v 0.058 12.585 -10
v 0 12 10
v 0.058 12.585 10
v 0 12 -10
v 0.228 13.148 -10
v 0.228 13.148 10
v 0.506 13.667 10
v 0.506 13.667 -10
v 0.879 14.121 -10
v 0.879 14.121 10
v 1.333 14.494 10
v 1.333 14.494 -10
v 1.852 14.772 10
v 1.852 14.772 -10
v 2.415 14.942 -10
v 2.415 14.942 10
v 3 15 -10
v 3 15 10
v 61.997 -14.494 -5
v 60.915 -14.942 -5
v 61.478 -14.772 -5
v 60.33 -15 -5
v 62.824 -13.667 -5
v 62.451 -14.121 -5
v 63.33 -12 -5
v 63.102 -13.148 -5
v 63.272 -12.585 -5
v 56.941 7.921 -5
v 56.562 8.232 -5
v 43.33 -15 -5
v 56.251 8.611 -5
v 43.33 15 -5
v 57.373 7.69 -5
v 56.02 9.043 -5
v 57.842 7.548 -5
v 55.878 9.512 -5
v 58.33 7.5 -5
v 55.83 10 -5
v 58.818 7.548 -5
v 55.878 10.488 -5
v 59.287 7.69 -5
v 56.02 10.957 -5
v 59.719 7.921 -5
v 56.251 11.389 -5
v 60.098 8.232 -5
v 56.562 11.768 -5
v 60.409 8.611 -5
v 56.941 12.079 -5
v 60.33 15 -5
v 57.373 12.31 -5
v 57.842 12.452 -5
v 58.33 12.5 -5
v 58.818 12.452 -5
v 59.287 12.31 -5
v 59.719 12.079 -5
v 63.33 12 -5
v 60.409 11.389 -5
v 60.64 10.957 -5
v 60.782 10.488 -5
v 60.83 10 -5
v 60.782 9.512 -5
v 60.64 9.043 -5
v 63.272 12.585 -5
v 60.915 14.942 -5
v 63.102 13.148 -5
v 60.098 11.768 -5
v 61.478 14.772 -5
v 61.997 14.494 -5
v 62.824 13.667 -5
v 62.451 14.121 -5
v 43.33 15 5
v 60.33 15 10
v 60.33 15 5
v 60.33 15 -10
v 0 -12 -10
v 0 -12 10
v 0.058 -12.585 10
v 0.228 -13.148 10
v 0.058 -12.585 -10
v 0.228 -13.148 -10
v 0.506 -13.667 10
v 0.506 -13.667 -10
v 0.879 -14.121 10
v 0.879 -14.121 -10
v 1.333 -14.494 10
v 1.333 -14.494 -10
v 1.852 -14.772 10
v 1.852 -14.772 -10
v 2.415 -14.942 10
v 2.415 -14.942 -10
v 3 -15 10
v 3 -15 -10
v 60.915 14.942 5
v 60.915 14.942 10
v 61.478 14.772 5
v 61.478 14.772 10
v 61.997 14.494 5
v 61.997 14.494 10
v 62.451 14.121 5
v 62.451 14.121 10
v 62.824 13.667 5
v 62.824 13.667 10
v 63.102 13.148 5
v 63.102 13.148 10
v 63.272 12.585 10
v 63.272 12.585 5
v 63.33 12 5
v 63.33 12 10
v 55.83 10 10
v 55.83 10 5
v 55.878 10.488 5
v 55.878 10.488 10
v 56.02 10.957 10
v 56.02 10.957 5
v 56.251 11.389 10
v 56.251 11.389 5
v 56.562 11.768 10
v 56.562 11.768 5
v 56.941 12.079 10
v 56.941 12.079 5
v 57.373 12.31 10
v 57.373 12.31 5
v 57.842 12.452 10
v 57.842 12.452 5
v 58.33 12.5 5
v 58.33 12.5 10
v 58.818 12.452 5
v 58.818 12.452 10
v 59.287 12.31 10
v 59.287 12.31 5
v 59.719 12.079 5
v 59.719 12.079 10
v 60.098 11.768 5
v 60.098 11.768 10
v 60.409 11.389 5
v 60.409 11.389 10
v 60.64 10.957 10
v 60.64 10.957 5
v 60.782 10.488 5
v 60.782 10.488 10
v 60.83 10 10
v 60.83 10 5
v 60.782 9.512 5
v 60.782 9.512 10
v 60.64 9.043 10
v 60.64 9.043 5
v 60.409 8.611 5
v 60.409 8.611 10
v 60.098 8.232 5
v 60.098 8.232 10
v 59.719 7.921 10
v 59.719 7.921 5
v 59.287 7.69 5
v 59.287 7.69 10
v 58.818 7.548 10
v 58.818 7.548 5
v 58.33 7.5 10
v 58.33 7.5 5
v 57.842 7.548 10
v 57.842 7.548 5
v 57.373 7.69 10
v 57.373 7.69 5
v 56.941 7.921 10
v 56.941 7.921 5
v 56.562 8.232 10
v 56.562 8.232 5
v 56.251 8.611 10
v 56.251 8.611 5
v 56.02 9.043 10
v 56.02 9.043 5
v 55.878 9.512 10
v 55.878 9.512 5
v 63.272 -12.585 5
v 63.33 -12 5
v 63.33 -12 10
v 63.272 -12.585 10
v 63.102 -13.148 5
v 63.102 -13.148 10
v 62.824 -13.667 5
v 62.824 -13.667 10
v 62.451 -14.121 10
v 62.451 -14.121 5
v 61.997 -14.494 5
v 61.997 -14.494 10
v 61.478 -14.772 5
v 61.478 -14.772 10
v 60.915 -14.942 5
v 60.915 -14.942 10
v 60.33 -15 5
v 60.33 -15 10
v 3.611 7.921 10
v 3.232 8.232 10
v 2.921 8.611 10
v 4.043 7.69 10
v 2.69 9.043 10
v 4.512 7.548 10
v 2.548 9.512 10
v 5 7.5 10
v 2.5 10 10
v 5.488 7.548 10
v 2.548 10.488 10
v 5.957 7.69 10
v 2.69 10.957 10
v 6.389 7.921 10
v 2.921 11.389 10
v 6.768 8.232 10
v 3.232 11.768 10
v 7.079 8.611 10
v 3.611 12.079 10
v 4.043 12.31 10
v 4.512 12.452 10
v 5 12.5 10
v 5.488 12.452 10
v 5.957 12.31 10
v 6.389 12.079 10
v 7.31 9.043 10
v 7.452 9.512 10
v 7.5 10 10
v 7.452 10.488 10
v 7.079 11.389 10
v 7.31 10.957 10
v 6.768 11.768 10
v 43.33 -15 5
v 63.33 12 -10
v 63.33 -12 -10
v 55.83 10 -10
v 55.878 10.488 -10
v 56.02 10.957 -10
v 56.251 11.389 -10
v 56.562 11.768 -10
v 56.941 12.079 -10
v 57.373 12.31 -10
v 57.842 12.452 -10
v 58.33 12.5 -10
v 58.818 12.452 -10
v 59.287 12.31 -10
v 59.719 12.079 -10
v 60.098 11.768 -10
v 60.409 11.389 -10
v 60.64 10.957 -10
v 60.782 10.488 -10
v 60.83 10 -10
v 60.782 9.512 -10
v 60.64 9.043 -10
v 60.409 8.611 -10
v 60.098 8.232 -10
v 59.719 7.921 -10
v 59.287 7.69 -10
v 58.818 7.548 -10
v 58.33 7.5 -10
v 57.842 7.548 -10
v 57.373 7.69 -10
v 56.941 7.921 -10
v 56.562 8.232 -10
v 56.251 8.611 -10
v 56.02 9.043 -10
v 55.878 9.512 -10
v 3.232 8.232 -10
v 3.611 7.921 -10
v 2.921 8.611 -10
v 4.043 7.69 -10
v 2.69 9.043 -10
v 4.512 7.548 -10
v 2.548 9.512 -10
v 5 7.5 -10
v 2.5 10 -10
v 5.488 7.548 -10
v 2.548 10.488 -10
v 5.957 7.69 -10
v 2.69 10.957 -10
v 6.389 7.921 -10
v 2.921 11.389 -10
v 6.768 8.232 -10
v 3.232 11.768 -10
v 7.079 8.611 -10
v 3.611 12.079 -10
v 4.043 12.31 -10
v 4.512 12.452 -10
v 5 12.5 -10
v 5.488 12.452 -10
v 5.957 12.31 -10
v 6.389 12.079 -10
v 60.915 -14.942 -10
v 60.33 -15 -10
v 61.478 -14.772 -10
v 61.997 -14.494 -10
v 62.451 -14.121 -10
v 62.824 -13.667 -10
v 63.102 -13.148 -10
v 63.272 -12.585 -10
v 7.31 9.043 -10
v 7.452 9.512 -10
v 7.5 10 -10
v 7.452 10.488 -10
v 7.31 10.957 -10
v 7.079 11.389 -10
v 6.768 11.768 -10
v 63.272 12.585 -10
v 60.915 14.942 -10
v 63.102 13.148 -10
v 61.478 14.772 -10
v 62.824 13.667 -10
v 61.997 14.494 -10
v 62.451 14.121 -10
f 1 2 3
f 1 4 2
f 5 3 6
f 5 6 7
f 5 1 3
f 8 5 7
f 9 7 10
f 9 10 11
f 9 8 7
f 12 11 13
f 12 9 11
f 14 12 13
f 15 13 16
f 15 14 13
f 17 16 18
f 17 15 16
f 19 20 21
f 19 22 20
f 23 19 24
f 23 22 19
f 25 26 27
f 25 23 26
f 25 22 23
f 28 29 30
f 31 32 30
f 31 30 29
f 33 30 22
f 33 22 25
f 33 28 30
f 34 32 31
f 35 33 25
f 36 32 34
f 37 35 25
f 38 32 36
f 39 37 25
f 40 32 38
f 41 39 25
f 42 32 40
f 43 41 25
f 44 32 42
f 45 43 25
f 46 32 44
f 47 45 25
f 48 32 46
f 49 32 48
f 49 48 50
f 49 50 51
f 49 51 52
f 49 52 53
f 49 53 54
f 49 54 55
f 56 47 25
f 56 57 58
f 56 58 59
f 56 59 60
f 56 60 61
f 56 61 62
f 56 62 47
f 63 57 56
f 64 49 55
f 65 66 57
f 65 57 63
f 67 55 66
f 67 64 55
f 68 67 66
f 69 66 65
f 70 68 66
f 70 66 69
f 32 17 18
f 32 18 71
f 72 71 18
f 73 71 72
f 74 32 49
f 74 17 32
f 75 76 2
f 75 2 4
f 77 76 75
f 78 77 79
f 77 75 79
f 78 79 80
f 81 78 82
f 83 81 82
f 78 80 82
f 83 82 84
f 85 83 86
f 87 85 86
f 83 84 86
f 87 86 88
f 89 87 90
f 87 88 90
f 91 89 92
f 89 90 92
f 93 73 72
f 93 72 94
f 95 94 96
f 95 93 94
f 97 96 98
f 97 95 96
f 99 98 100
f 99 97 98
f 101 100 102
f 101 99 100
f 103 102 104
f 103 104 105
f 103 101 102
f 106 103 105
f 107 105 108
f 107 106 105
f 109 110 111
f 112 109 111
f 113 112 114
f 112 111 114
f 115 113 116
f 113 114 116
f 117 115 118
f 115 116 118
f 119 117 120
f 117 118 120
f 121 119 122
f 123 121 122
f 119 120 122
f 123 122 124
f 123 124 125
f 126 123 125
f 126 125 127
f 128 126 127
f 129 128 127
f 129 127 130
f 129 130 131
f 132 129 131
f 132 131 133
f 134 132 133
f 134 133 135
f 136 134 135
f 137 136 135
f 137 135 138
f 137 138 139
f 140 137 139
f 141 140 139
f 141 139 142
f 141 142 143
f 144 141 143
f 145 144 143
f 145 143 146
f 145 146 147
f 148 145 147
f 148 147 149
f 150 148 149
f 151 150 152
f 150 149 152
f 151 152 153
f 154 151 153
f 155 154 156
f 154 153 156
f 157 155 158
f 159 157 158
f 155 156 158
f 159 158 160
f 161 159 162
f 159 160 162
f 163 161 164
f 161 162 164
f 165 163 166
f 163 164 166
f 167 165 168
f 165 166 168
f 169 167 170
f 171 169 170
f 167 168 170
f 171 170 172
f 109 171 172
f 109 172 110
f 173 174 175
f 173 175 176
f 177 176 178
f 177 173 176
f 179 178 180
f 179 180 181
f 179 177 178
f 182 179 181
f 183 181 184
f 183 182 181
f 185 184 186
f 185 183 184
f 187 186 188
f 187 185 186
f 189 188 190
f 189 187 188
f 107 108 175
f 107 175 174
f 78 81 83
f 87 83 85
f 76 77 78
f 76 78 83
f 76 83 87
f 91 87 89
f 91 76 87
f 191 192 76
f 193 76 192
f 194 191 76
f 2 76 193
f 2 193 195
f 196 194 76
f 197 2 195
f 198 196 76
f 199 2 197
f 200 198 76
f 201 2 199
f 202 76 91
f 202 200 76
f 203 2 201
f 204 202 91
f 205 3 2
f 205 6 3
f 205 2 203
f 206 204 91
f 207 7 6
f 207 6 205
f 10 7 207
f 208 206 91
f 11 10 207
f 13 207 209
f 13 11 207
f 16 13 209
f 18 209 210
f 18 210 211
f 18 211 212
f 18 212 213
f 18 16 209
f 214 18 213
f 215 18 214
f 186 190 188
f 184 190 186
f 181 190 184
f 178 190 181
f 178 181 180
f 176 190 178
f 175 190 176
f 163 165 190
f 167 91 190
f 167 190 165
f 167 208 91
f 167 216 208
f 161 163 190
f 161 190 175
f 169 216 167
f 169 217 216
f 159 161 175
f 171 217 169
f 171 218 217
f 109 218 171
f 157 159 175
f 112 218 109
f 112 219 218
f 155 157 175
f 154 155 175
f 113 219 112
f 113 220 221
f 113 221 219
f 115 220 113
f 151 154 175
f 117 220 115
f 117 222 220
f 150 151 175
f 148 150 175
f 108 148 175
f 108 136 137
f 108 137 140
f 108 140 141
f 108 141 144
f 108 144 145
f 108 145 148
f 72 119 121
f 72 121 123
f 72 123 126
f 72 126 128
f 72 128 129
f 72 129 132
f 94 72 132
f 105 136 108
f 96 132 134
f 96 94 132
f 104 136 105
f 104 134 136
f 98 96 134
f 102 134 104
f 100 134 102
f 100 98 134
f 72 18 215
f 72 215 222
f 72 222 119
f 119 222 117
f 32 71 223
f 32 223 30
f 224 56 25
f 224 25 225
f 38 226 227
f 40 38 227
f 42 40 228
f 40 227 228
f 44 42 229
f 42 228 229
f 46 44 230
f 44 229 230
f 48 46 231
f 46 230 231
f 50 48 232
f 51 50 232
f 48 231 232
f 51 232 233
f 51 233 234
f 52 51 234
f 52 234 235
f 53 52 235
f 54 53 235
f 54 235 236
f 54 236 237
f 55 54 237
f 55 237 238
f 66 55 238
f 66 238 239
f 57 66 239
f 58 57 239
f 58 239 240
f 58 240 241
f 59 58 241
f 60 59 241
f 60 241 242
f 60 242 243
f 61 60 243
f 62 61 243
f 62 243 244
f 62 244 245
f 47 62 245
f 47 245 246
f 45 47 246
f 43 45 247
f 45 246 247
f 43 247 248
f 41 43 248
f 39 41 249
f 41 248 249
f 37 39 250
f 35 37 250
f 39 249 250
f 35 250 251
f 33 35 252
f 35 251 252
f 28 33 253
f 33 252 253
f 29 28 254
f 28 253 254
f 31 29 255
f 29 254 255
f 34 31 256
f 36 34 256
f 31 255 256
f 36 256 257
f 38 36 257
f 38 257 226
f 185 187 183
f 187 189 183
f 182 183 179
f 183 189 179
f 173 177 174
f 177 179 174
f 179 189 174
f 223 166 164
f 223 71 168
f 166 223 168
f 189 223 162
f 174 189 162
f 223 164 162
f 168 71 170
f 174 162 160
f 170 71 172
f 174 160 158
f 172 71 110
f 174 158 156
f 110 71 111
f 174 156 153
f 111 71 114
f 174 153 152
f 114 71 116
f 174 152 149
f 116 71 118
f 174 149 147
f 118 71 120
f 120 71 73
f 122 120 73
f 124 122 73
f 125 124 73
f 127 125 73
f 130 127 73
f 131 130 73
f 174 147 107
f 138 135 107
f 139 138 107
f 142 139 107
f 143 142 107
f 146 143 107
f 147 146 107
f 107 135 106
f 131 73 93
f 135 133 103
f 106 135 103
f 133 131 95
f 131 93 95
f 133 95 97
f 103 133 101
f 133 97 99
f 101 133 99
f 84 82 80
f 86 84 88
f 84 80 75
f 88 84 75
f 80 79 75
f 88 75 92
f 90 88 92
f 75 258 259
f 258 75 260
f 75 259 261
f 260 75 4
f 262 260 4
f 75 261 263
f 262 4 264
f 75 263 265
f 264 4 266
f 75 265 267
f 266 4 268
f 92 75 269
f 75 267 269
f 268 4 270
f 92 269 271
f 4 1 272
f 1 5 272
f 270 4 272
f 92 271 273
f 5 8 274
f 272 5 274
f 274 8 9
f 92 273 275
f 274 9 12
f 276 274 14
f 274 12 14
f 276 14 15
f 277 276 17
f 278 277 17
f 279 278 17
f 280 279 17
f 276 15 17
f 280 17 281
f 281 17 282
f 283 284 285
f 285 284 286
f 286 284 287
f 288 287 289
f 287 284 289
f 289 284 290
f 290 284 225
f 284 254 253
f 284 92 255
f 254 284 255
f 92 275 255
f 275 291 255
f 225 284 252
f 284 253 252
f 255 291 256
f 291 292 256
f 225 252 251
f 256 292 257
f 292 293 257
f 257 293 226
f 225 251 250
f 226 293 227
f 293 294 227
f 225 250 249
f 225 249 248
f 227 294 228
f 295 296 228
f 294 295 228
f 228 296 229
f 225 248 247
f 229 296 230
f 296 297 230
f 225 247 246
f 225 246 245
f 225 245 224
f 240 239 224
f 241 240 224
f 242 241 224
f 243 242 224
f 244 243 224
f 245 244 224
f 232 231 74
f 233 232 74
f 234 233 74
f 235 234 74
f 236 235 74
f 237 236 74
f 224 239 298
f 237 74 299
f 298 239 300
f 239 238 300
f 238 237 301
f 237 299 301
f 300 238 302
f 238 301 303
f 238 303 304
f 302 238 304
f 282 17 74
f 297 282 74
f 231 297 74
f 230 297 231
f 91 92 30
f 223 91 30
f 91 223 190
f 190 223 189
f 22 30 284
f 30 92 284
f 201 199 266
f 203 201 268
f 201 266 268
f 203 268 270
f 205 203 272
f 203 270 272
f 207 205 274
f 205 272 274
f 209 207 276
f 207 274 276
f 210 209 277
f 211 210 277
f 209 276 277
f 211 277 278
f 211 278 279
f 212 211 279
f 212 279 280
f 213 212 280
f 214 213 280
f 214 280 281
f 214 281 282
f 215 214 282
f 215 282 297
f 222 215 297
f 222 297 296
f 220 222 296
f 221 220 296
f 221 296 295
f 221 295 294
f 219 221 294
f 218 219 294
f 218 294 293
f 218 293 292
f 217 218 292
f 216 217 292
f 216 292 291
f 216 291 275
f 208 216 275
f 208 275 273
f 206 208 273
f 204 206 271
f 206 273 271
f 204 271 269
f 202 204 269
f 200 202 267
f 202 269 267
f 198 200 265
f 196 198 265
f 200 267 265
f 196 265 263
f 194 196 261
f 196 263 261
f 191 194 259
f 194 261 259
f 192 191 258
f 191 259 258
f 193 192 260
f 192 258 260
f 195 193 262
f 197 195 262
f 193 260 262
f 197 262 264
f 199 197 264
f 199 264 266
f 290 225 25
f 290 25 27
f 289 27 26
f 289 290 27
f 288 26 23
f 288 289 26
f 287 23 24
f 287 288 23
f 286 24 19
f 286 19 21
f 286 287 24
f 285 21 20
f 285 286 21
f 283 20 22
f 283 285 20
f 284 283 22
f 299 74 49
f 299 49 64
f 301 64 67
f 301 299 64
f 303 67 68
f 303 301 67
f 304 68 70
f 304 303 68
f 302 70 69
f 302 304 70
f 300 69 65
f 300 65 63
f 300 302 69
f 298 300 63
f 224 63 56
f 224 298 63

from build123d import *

# Parameters (mm, degrees)
ESQUISSE2_W             = 63.33
ESQUISSE2_H             = 20
BOSS_EXTRU_1_DEPTH      = 15
CONG_1_R                = 3
ESQUISSE4_W             = 20
ESQUISSE4_H             = 10
ENL_V_MAT_EXTRU_1_DEPTH = 31
ESQUISSE5_R             = 2.5
ENL_V_MAT_EXTRU_2_DEPTH = 21


with BuildPart() as part:
    # Esquisse2 → Boss.-Extru.1 (new body, symmetric)
    with BuildSketch(Plane(origin=(0, 0, 0), x_dir=(1, 0, 0), z_dir=(0, 1, 0))):
        with Locations((31.665, 0)):
            Rectangle(ESQUISSE2_W, ESQUISSE2_H)
    extrude(amount=BOSS_EXTRU_1_DEPTH, both=True)

    # Congé1
    cong_1_edges = [part.edges().sort_by_distance(p)[0] for p in [
        (63.33, 15, 0),
        (0, 15, 0),
        (63.33, -15, 0),
        (0, -15, 0),
    ]]
    fillet(cong_1_edges, radius=CONG_1_R)

    # Esquisse4 → Enlèv. mat.-Extru.1 (cut, through all)
    with BuildSketch(Plane(origin=(0, 15, 0), x_dir=(1, 0, 0), z_dir=(0, 1, 0))):
        with Locations((53.33, 0)):
            Rectangle(ESQUISSE4_W, ESQUISSE4_H)
    extrude(amount=-ENL_V_MAT_EXTRU_1_DEPTH, mode=Mode.SUBTRACT)

    # Esquisse5 → Enlèv. mat.-Extru.2 (cut, through all)
    with BuildSketch(Plane(origin=(0, 0, -10), x_dir=(-1, 0, 0), z_dir=(0, 0, -1))):
        with Locations((-58.33, 10)):
            Circle(ESQUISSE5_R)
        with Locations((-5, 10)):
            Circle(ESQUISSE5_R)
    extrude(amount=-ENL_V_MAT_EXTRU_2_DEPTH, mode=Mode.SUBTRACT)


solid = part.part
